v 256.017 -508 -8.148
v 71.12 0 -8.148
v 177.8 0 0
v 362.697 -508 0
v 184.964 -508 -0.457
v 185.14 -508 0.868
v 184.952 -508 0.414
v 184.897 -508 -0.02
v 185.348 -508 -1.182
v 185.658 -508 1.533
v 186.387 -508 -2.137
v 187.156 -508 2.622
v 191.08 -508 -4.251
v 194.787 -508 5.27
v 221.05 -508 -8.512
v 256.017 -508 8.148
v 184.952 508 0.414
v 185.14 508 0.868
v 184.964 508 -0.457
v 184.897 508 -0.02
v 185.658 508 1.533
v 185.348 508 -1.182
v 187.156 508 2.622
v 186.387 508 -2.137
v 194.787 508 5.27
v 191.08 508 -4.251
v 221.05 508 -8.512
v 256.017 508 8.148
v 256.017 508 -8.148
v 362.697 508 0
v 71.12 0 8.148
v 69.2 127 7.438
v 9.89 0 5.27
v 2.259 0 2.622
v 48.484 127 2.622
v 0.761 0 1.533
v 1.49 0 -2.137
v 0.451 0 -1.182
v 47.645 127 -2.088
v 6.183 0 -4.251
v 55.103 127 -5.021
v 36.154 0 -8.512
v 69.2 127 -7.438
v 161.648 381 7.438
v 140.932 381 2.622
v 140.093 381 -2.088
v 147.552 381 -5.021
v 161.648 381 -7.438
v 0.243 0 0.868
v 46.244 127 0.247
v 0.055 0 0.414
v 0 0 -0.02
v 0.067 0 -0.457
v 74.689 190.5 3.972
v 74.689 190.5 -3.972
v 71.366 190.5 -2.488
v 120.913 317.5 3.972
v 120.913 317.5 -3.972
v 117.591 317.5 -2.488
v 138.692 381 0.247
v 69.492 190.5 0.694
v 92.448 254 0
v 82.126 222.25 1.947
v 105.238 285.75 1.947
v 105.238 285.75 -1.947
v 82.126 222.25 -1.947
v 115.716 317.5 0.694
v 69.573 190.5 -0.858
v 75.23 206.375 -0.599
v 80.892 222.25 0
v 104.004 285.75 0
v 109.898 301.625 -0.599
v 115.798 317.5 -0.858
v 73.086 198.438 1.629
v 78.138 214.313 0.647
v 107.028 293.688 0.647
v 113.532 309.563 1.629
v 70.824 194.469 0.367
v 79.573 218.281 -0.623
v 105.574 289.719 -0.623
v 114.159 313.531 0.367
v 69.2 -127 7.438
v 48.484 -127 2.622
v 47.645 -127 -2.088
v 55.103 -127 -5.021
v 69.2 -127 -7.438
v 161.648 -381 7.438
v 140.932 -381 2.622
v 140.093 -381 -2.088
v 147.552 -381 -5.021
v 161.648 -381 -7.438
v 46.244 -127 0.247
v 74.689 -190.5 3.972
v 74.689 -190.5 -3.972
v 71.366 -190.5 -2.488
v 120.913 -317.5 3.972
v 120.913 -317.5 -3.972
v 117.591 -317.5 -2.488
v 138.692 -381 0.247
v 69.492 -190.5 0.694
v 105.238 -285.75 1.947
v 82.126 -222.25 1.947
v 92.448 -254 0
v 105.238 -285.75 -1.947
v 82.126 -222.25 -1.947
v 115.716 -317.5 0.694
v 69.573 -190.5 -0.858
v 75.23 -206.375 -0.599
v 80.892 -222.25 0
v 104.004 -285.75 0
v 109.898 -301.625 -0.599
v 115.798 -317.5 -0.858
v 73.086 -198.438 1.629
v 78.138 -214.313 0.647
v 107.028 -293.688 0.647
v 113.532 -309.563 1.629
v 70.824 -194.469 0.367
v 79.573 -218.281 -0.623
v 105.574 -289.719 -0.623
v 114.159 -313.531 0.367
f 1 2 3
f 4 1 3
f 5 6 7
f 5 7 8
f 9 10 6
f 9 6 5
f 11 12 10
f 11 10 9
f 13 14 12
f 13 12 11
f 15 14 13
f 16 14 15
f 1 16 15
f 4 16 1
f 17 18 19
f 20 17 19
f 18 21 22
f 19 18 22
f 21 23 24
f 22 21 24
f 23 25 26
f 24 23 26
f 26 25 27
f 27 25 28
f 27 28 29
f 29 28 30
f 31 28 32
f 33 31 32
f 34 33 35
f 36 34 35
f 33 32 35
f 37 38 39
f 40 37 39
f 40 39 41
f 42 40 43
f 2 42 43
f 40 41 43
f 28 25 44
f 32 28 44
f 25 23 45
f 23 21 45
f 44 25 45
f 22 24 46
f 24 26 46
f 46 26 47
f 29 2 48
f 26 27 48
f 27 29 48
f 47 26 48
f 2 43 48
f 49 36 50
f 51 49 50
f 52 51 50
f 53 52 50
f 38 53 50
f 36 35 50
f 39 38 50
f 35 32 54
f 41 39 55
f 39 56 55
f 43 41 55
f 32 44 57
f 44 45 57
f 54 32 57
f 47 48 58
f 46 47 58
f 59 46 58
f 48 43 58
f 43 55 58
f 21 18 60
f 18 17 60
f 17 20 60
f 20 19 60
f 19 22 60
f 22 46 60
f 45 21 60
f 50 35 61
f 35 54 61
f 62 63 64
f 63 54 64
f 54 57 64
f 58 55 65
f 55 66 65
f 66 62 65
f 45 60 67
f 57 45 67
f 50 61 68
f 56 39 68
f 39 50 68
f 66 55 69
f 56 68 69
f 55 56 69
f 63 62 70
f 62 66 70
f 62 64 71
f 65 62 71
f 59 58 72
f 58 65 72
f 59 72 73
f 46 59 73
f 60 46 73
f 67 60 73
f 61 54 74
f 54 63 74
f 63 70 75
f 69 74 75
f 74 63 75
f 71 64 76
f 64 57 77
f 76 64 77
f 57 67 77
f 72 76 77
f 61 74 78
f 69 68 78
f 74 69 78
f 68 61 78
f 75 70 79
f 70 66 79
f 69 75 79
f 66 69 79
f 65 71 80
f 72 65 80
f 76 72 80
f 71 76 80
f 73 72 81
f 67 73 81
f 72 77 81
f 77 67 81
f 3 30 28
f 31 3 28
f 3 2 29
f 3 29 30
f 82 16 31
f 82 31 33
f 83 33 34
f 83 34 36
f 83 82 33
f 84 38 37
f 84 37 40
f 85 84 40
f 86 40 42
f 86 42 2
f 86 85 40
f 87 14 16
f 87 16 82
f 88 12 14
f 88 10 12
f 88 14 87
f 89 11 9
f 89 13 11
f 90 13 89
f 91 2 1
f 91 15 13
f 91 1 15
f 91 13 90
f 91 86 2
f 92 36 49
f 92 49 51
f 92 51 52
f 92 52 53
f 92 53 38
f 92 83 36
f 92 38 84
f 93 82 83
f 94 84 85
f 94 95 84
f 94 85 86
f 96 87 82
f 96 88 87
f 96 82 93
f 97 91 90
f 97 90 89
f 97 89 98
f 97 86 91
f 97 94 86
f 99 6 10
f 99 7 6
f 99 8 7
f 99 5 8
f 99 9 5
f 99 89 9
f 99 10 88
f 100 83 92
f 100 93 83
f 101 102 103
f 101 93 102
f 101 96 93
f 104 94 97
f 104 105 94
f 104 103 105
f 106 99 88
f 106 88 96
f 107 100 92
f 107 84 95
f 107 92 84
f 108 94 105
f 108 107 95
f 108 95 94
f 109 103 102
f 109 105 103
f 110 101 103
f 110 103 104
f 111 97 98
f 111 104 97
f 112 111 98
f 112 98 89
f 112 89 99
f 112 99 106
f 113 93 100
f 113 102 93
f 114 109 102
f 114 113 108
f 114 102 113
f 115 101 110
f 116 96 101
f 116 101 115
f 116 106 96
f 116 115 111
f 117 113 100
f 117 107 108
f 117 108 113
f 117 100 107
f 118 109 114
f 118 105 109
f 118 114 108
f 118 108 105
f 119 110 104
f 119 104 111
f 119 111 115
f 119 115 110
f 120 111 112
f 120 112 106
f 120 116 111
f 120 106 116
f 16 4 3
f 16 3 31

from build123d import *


# Not quite as in the source:
# - a pattern or mirror of a feature is missing from the dataset's text; its kind, count and spacing are read off the source's solid


with BuildPart() as f2:
    # F2: sweep along a path in F1
    with BuildLine(Plane.XY) as f2_path:
        Line((0, 0), (184.8968790072, 508))
    # F0 (on Front) → F2 (sweep)
    with BuildSketch(Plane.XZ):
        with BuildLine():
            add(Edge.make_bspline(
                [(71.12, 8.1478195856), (0, 13.5796993094), (0, 0)],
                knots=[4.3008721343, 4.3008721343, 4.3008721343, 6.2831853072, 6.2831853072, 6.2831853072], degree=2, weights=[1, 0.5477225575, 1]))
            add(Edge.make_bspline(
                [(0, 0), (0, -13.5796993094), (71.12, -8.1478195856)],
                knots=[0, 0, 0, 1.9823131729, 1.9823131729, 1.9823131729], degree=2, weights=[1, 0.5477225575, 1]))
            add(Edge.make_bspline(
                [(71.12, -8.1478195856), (177.8, 0), (71.12, 8.1478195856)],
                knots=[1.9823131729, 1.9823131729, 1.9823131729, 4.3008721343, 4.3008721343, 4.3008721343], degree=2, weights=[1, 0.4, 1]))
        make_face()
        with BuildLine():
            add(Edge.make_bspline(
                [(71.12, -8.1478195856), (177.8, 0), (71.12, 8.1478195856)],
                knots=[1.9823131729, 1.9823131729, 1.9823131729, 4.3008721343, 4.3008721343, 4.3008721343], degree=2, weights=[1, 0.4, 1]))
            Line((71.12, -8.1478195856), (177.8, 0))
            Line((177.8, 0), (71.12, 8.1478195856))
        make_face()
    sweep(path=f2_path.line)

    # F2_copies: F2 across plane


with BuildPart() as f2_1:
    add(f2.part)
    add(f2.part.mirror(Plane(origin=(0, 0, 0), x_dir=(0, 0, -1), z_dir=(0, -1, 0))))


solid = f2_1.part
